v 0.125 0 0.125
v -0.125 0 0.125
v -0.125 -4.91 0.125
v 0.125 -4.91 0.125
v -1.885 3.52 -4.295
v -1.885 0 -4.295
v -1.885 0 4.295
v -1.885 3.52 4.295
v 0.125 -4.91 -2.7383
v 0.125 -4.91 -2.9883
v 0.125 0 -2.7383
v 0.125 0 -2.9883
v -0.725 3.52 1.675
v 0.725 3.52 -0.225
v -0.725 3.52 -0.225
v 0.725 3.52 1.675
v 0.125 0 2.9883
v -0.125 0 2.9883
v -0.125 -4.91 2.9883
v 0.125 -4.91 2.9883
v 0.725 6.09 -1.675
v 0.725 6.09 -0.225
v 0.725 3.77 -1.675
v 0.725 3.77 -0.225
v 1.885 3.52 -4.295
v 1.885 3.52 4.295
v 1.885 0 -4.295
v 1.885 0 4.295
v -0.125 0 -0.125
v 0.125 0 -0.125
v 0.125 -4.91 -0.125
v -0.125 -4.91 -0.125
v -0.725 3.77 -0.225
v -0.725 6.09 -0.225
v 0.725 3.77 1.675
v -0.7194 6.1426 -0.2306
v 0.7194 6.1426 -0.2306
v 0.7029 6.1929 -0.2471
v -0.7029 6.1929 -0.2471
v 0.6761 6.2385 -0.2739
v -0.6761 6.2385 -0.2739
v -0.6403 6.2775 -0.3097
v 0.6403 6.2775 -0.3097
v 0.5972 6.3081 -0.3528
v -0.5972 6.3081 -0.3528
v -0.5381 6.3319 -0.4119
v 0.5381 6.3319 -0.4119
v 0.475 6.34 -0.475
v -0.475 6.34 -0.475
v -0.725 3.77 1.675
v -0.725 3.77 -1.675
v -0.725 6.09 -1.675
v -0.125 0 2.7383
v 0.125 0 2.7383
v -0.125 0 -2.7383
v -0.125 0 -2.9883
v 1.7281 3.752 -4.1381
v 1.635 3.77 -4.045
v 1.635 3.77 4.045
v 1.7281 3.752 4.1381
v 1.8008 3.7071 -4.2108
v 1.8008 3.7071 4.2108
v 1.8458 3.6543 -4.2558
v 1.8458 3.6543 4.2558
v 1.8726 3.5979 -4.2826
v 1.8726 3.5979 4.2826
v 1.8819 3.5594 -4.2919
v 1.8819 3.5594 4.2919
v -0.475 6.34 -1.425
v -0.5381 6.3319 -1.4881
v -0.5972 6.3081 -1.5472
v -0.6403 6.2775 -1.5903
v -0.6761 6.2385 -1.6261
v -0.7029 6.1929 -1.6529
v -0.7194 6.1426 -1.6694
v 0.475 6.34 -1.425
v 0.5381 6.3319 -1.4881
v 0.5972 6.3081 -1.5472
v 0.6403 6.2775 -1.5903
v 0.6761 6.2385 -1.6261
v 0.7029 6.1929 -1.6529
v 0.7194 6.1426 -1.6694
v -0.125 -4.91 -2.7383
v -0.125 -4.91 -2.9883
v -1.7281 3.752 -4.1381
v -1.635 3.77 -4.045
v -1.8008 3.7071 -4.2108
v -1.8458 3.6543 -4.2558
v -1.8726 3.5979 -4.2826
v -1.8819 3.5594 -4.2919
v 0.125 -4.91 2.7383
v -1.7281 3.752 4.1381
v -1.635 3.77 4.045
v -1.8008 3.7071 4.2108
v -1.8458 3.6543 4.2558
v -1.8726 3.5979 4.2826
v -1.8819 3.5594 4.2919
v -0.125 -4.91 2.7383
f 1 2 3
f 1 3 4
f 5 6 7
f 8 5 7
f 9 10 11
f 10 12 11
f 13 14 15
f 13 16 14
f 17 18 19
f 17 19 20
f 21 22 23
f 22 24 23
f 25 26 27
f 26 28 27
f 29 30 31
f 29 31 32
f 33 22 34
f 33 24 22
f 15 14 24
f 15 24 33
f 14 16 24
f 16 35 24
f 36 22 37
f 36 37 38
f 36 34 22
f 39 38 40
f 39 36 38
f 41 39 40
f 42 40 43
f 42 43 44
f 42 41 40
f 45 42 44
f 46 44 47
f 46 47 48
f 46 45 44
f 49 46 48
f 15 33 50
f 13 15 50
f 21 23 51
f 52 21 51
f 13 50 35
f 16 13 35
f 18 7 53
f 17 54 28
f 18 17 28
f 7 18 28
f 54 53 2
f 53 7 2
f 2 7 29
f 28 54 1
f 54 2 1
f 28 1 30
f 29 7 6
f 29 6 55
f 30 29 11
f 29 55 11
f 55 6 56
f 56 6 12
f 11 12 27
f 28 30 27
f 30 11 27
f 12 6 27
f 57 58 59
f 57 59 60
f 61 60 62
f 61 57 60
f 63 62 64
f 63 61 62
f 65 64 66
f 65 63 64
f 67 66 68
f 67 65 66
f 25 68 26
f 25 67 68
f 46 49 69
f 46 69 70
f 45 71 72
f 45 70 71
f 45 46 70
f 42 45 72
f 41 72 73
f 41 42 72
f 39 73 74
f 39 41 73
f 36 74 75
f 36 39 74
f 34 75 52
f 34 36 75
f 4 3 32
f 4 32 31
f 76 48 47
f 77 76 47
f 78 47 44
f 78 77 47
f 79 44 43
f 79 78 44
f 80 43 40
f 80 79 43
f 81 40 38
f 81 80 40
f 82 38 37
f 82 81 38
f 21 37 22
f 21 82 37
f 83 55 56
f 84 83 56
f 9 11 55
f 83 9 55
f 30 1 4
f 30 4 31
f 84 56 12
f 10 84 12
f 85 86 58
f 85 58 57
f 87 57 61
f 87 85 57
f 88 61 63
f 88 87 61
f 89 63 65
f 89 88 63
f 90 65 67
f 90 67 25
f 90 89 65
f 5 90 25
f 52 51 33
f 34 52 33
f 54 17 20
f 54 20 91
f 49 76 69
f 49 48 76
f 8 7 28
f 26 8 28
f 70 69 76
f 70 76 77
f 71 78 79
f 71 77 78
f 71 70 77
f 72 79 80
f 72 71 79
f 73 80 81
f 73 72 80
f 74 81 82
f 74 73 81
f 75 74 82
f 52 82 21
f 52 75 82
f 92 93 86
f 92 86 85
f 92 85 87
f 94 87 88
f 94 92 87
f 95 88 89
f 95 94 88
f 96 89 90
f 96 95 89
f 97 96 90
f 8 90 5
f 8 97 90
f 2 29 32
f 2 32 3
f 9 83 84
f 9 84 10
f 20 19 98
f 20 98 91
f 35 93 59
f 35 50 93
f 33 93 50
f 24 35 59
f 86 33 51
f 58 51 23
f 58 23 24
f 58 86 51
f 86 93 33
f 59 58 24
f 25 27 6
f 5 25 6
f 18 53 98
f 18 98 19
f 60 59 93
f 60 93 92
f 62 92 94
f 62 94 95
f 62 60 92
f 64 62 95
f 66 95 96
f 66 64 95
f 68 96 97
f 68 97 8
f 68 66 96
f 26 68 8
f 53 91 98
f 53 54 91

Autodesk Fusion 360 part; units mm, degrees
sketch "Sketch1" plane through (0, 0, 0) normal (0, 1, 0) x (1, 0, 0)
  line L0 (1.885, 4.295) -> (-1.885, 4.295)
  line L1 (-1.885, 4.295) -> (-1.885, -4.295)
  line L2 (-1.885, -4.295) -> (1.885, -4.295)
  line L3 (1.885, -4.295) -> (1.885, 4.295)
  line L4 (1.885, 4.295) -> (-1.885, -4.295) construction
  line L5 (-1.885, 4.295) -> (1.885, -4.295) construction
  dimension "d1" = 3.77
  dimension "d2" = 8.59
extrude "Extrude1" add sketch "Sketch1" along normal blind 3.77
sketch "Sketch2" plane through (0, 3.77, 0) normal (0, 1, 0) x (-1, 0, 0)
  line L0 (-1.885, 4.295) -> (-1.885, -4.295)
  line L1 (-1.885, -4.295) -> (1.885, -4.295)
  line L2 (1.885, -4.295) -> (1.885, 4.295)
  line L3 (1.885, 4.295) -> (-1.885, 4.295)
  line L4 (0.725, 1.675) -> (-0.725, 1.675)
  line L5 (-0.725, 1.675) -> (-0.725, -1.675)
  line L6 (-0.725, -1.675) -> (0.725, -1.675)
  line L7 (0.725, -1.675) -> (0.725, 1.675)
  line L8 (0.725, 1.675) -> (-0.725, -1.675) construction
  line L9 (-0.725, 1.675) -> (0.725, -1.675) construction
  dimension "d5" = 1.45
  dimension "d6" = 3.35
extrude "Extrude2" cut sketch "Sketch2" against normal blind 0.25 contours L4 L5 L6 L7
sketch "Sketch3" plane through (0, 3.52, 0) normal (0, 1, 0) x (-1, 0, 0)
  line L0 (0.725, -1.675) -> (0.725, 1.675)
  line L1 (0.725, 1.675) -> (-0.725, 1.675)
  line L2 (-0.725, 1.675) -> (-0.725, -1.675)
  line L3 (-0.725, -1.675) -> (0.725, -1.675)
  line L4 (0.725, -1.675) -> (-0.725, -1.675)
  line L5 (-0.725, -1.675) -> (-0.725, -0.225)
  line L6 (-0.725, -0.225) -> (0.725, -0.225)
  line L7 (0.725, -0.225) -> (0.725, -1.675)
  dimension "d9" = 1.45
  dimension "d10" = 1.45
extrude "Extrude3" add sketch "Sketch3" along normal blind 2.82 contours L0 L2 L3 L4 L5 L6 L7
sketch "Sketch4" plane through (0, 0, 0) normal (0, -1, 0) x (1, 0, 0)
  line L0 (1.885, -4.295) -> (1.885, 4.295)
  line L1 (1.885, 4.295) -> (-1.885, 4.295)
  line L2 (-1.885, 4.295) -> (-1.885, -4.295)
  line L3 (-1.885, -4.295) -> (1.885, -4.295)
  line L4 (0, -4.295) -> (0, 4.295) construction
  line L5 (1.885, 0) -> (-1.885, 0) construction
  line L6 (0.125, -0.125) -> (-0.125, -0.125)
  line L7 (-0.125, -0.125) -> (-0.125, 0.125)
  line L8 (-0.125, 0.125) -> (0.125, 0.125)
  line L9 (0.125, 0.125) -> (0.125, -0.125)
  line L10 (0.125, -0.125) -> (-0.125, 0.125) construction
  line L11 (-0.125, -0.125) -> (0.125, 0.125) construction
  line L12 (0.125, 2.7383) -> (-0.125, 2.7383)
  line L13 (-0.125, 2.7383) -> (-0.125, 2.9883)
  line L14 (-0.125, 2.9883) -> (0.125, 2.9883)
  line L15 (0.125, 2.9883) -> (0.125, 2.7383)
  line L16 (0.125, 2.7383) -> (-0.125, 2.9883) construction
  line L17 (-0.125, 2.7383) -> (0.125, 2.9883) construction
  line L18 (0.125, -2.9883) -> (0.125, -2.7383)
  line L19 (0.125, -2.7383) -> (-0.125, -2.7383)
  line L20 (-0.125, -2.7383) -> (-0.125, -2.9883)
  line L21 (-0.125, -2.9883) -> (0.125, -2.9883)
  point P0 (0, 2.8633)
  point P1 (0, -2.8633)
  dimension "d14" = 0.25
  dimension "d15" = 0.25
  dimension "d16" = 0.25
  dimension "d17" = 0.25
  dimension "d18" = 2.8633
extrude "Extrude4" add sketch "Sketch4" along normal blind 4.91 contours L6 L7 L8 L9 | L12 L13 L14 L15 | L18 L19 L20 L21
fillet "Fillet1" radius 0.25 4 edges at (1.885, 3.77, 0) (0, 3.77, 4.295) (0, 3.77, -4.295) (-1.885, 3.77, 0)
fillet "Fillet2" radius 0.25 4 edges at (0.725, 6.34, -0.95) (0, 6.34, -1.675) (-0.725, 6.34, -0.95) (0, 6.34, -0.225)
